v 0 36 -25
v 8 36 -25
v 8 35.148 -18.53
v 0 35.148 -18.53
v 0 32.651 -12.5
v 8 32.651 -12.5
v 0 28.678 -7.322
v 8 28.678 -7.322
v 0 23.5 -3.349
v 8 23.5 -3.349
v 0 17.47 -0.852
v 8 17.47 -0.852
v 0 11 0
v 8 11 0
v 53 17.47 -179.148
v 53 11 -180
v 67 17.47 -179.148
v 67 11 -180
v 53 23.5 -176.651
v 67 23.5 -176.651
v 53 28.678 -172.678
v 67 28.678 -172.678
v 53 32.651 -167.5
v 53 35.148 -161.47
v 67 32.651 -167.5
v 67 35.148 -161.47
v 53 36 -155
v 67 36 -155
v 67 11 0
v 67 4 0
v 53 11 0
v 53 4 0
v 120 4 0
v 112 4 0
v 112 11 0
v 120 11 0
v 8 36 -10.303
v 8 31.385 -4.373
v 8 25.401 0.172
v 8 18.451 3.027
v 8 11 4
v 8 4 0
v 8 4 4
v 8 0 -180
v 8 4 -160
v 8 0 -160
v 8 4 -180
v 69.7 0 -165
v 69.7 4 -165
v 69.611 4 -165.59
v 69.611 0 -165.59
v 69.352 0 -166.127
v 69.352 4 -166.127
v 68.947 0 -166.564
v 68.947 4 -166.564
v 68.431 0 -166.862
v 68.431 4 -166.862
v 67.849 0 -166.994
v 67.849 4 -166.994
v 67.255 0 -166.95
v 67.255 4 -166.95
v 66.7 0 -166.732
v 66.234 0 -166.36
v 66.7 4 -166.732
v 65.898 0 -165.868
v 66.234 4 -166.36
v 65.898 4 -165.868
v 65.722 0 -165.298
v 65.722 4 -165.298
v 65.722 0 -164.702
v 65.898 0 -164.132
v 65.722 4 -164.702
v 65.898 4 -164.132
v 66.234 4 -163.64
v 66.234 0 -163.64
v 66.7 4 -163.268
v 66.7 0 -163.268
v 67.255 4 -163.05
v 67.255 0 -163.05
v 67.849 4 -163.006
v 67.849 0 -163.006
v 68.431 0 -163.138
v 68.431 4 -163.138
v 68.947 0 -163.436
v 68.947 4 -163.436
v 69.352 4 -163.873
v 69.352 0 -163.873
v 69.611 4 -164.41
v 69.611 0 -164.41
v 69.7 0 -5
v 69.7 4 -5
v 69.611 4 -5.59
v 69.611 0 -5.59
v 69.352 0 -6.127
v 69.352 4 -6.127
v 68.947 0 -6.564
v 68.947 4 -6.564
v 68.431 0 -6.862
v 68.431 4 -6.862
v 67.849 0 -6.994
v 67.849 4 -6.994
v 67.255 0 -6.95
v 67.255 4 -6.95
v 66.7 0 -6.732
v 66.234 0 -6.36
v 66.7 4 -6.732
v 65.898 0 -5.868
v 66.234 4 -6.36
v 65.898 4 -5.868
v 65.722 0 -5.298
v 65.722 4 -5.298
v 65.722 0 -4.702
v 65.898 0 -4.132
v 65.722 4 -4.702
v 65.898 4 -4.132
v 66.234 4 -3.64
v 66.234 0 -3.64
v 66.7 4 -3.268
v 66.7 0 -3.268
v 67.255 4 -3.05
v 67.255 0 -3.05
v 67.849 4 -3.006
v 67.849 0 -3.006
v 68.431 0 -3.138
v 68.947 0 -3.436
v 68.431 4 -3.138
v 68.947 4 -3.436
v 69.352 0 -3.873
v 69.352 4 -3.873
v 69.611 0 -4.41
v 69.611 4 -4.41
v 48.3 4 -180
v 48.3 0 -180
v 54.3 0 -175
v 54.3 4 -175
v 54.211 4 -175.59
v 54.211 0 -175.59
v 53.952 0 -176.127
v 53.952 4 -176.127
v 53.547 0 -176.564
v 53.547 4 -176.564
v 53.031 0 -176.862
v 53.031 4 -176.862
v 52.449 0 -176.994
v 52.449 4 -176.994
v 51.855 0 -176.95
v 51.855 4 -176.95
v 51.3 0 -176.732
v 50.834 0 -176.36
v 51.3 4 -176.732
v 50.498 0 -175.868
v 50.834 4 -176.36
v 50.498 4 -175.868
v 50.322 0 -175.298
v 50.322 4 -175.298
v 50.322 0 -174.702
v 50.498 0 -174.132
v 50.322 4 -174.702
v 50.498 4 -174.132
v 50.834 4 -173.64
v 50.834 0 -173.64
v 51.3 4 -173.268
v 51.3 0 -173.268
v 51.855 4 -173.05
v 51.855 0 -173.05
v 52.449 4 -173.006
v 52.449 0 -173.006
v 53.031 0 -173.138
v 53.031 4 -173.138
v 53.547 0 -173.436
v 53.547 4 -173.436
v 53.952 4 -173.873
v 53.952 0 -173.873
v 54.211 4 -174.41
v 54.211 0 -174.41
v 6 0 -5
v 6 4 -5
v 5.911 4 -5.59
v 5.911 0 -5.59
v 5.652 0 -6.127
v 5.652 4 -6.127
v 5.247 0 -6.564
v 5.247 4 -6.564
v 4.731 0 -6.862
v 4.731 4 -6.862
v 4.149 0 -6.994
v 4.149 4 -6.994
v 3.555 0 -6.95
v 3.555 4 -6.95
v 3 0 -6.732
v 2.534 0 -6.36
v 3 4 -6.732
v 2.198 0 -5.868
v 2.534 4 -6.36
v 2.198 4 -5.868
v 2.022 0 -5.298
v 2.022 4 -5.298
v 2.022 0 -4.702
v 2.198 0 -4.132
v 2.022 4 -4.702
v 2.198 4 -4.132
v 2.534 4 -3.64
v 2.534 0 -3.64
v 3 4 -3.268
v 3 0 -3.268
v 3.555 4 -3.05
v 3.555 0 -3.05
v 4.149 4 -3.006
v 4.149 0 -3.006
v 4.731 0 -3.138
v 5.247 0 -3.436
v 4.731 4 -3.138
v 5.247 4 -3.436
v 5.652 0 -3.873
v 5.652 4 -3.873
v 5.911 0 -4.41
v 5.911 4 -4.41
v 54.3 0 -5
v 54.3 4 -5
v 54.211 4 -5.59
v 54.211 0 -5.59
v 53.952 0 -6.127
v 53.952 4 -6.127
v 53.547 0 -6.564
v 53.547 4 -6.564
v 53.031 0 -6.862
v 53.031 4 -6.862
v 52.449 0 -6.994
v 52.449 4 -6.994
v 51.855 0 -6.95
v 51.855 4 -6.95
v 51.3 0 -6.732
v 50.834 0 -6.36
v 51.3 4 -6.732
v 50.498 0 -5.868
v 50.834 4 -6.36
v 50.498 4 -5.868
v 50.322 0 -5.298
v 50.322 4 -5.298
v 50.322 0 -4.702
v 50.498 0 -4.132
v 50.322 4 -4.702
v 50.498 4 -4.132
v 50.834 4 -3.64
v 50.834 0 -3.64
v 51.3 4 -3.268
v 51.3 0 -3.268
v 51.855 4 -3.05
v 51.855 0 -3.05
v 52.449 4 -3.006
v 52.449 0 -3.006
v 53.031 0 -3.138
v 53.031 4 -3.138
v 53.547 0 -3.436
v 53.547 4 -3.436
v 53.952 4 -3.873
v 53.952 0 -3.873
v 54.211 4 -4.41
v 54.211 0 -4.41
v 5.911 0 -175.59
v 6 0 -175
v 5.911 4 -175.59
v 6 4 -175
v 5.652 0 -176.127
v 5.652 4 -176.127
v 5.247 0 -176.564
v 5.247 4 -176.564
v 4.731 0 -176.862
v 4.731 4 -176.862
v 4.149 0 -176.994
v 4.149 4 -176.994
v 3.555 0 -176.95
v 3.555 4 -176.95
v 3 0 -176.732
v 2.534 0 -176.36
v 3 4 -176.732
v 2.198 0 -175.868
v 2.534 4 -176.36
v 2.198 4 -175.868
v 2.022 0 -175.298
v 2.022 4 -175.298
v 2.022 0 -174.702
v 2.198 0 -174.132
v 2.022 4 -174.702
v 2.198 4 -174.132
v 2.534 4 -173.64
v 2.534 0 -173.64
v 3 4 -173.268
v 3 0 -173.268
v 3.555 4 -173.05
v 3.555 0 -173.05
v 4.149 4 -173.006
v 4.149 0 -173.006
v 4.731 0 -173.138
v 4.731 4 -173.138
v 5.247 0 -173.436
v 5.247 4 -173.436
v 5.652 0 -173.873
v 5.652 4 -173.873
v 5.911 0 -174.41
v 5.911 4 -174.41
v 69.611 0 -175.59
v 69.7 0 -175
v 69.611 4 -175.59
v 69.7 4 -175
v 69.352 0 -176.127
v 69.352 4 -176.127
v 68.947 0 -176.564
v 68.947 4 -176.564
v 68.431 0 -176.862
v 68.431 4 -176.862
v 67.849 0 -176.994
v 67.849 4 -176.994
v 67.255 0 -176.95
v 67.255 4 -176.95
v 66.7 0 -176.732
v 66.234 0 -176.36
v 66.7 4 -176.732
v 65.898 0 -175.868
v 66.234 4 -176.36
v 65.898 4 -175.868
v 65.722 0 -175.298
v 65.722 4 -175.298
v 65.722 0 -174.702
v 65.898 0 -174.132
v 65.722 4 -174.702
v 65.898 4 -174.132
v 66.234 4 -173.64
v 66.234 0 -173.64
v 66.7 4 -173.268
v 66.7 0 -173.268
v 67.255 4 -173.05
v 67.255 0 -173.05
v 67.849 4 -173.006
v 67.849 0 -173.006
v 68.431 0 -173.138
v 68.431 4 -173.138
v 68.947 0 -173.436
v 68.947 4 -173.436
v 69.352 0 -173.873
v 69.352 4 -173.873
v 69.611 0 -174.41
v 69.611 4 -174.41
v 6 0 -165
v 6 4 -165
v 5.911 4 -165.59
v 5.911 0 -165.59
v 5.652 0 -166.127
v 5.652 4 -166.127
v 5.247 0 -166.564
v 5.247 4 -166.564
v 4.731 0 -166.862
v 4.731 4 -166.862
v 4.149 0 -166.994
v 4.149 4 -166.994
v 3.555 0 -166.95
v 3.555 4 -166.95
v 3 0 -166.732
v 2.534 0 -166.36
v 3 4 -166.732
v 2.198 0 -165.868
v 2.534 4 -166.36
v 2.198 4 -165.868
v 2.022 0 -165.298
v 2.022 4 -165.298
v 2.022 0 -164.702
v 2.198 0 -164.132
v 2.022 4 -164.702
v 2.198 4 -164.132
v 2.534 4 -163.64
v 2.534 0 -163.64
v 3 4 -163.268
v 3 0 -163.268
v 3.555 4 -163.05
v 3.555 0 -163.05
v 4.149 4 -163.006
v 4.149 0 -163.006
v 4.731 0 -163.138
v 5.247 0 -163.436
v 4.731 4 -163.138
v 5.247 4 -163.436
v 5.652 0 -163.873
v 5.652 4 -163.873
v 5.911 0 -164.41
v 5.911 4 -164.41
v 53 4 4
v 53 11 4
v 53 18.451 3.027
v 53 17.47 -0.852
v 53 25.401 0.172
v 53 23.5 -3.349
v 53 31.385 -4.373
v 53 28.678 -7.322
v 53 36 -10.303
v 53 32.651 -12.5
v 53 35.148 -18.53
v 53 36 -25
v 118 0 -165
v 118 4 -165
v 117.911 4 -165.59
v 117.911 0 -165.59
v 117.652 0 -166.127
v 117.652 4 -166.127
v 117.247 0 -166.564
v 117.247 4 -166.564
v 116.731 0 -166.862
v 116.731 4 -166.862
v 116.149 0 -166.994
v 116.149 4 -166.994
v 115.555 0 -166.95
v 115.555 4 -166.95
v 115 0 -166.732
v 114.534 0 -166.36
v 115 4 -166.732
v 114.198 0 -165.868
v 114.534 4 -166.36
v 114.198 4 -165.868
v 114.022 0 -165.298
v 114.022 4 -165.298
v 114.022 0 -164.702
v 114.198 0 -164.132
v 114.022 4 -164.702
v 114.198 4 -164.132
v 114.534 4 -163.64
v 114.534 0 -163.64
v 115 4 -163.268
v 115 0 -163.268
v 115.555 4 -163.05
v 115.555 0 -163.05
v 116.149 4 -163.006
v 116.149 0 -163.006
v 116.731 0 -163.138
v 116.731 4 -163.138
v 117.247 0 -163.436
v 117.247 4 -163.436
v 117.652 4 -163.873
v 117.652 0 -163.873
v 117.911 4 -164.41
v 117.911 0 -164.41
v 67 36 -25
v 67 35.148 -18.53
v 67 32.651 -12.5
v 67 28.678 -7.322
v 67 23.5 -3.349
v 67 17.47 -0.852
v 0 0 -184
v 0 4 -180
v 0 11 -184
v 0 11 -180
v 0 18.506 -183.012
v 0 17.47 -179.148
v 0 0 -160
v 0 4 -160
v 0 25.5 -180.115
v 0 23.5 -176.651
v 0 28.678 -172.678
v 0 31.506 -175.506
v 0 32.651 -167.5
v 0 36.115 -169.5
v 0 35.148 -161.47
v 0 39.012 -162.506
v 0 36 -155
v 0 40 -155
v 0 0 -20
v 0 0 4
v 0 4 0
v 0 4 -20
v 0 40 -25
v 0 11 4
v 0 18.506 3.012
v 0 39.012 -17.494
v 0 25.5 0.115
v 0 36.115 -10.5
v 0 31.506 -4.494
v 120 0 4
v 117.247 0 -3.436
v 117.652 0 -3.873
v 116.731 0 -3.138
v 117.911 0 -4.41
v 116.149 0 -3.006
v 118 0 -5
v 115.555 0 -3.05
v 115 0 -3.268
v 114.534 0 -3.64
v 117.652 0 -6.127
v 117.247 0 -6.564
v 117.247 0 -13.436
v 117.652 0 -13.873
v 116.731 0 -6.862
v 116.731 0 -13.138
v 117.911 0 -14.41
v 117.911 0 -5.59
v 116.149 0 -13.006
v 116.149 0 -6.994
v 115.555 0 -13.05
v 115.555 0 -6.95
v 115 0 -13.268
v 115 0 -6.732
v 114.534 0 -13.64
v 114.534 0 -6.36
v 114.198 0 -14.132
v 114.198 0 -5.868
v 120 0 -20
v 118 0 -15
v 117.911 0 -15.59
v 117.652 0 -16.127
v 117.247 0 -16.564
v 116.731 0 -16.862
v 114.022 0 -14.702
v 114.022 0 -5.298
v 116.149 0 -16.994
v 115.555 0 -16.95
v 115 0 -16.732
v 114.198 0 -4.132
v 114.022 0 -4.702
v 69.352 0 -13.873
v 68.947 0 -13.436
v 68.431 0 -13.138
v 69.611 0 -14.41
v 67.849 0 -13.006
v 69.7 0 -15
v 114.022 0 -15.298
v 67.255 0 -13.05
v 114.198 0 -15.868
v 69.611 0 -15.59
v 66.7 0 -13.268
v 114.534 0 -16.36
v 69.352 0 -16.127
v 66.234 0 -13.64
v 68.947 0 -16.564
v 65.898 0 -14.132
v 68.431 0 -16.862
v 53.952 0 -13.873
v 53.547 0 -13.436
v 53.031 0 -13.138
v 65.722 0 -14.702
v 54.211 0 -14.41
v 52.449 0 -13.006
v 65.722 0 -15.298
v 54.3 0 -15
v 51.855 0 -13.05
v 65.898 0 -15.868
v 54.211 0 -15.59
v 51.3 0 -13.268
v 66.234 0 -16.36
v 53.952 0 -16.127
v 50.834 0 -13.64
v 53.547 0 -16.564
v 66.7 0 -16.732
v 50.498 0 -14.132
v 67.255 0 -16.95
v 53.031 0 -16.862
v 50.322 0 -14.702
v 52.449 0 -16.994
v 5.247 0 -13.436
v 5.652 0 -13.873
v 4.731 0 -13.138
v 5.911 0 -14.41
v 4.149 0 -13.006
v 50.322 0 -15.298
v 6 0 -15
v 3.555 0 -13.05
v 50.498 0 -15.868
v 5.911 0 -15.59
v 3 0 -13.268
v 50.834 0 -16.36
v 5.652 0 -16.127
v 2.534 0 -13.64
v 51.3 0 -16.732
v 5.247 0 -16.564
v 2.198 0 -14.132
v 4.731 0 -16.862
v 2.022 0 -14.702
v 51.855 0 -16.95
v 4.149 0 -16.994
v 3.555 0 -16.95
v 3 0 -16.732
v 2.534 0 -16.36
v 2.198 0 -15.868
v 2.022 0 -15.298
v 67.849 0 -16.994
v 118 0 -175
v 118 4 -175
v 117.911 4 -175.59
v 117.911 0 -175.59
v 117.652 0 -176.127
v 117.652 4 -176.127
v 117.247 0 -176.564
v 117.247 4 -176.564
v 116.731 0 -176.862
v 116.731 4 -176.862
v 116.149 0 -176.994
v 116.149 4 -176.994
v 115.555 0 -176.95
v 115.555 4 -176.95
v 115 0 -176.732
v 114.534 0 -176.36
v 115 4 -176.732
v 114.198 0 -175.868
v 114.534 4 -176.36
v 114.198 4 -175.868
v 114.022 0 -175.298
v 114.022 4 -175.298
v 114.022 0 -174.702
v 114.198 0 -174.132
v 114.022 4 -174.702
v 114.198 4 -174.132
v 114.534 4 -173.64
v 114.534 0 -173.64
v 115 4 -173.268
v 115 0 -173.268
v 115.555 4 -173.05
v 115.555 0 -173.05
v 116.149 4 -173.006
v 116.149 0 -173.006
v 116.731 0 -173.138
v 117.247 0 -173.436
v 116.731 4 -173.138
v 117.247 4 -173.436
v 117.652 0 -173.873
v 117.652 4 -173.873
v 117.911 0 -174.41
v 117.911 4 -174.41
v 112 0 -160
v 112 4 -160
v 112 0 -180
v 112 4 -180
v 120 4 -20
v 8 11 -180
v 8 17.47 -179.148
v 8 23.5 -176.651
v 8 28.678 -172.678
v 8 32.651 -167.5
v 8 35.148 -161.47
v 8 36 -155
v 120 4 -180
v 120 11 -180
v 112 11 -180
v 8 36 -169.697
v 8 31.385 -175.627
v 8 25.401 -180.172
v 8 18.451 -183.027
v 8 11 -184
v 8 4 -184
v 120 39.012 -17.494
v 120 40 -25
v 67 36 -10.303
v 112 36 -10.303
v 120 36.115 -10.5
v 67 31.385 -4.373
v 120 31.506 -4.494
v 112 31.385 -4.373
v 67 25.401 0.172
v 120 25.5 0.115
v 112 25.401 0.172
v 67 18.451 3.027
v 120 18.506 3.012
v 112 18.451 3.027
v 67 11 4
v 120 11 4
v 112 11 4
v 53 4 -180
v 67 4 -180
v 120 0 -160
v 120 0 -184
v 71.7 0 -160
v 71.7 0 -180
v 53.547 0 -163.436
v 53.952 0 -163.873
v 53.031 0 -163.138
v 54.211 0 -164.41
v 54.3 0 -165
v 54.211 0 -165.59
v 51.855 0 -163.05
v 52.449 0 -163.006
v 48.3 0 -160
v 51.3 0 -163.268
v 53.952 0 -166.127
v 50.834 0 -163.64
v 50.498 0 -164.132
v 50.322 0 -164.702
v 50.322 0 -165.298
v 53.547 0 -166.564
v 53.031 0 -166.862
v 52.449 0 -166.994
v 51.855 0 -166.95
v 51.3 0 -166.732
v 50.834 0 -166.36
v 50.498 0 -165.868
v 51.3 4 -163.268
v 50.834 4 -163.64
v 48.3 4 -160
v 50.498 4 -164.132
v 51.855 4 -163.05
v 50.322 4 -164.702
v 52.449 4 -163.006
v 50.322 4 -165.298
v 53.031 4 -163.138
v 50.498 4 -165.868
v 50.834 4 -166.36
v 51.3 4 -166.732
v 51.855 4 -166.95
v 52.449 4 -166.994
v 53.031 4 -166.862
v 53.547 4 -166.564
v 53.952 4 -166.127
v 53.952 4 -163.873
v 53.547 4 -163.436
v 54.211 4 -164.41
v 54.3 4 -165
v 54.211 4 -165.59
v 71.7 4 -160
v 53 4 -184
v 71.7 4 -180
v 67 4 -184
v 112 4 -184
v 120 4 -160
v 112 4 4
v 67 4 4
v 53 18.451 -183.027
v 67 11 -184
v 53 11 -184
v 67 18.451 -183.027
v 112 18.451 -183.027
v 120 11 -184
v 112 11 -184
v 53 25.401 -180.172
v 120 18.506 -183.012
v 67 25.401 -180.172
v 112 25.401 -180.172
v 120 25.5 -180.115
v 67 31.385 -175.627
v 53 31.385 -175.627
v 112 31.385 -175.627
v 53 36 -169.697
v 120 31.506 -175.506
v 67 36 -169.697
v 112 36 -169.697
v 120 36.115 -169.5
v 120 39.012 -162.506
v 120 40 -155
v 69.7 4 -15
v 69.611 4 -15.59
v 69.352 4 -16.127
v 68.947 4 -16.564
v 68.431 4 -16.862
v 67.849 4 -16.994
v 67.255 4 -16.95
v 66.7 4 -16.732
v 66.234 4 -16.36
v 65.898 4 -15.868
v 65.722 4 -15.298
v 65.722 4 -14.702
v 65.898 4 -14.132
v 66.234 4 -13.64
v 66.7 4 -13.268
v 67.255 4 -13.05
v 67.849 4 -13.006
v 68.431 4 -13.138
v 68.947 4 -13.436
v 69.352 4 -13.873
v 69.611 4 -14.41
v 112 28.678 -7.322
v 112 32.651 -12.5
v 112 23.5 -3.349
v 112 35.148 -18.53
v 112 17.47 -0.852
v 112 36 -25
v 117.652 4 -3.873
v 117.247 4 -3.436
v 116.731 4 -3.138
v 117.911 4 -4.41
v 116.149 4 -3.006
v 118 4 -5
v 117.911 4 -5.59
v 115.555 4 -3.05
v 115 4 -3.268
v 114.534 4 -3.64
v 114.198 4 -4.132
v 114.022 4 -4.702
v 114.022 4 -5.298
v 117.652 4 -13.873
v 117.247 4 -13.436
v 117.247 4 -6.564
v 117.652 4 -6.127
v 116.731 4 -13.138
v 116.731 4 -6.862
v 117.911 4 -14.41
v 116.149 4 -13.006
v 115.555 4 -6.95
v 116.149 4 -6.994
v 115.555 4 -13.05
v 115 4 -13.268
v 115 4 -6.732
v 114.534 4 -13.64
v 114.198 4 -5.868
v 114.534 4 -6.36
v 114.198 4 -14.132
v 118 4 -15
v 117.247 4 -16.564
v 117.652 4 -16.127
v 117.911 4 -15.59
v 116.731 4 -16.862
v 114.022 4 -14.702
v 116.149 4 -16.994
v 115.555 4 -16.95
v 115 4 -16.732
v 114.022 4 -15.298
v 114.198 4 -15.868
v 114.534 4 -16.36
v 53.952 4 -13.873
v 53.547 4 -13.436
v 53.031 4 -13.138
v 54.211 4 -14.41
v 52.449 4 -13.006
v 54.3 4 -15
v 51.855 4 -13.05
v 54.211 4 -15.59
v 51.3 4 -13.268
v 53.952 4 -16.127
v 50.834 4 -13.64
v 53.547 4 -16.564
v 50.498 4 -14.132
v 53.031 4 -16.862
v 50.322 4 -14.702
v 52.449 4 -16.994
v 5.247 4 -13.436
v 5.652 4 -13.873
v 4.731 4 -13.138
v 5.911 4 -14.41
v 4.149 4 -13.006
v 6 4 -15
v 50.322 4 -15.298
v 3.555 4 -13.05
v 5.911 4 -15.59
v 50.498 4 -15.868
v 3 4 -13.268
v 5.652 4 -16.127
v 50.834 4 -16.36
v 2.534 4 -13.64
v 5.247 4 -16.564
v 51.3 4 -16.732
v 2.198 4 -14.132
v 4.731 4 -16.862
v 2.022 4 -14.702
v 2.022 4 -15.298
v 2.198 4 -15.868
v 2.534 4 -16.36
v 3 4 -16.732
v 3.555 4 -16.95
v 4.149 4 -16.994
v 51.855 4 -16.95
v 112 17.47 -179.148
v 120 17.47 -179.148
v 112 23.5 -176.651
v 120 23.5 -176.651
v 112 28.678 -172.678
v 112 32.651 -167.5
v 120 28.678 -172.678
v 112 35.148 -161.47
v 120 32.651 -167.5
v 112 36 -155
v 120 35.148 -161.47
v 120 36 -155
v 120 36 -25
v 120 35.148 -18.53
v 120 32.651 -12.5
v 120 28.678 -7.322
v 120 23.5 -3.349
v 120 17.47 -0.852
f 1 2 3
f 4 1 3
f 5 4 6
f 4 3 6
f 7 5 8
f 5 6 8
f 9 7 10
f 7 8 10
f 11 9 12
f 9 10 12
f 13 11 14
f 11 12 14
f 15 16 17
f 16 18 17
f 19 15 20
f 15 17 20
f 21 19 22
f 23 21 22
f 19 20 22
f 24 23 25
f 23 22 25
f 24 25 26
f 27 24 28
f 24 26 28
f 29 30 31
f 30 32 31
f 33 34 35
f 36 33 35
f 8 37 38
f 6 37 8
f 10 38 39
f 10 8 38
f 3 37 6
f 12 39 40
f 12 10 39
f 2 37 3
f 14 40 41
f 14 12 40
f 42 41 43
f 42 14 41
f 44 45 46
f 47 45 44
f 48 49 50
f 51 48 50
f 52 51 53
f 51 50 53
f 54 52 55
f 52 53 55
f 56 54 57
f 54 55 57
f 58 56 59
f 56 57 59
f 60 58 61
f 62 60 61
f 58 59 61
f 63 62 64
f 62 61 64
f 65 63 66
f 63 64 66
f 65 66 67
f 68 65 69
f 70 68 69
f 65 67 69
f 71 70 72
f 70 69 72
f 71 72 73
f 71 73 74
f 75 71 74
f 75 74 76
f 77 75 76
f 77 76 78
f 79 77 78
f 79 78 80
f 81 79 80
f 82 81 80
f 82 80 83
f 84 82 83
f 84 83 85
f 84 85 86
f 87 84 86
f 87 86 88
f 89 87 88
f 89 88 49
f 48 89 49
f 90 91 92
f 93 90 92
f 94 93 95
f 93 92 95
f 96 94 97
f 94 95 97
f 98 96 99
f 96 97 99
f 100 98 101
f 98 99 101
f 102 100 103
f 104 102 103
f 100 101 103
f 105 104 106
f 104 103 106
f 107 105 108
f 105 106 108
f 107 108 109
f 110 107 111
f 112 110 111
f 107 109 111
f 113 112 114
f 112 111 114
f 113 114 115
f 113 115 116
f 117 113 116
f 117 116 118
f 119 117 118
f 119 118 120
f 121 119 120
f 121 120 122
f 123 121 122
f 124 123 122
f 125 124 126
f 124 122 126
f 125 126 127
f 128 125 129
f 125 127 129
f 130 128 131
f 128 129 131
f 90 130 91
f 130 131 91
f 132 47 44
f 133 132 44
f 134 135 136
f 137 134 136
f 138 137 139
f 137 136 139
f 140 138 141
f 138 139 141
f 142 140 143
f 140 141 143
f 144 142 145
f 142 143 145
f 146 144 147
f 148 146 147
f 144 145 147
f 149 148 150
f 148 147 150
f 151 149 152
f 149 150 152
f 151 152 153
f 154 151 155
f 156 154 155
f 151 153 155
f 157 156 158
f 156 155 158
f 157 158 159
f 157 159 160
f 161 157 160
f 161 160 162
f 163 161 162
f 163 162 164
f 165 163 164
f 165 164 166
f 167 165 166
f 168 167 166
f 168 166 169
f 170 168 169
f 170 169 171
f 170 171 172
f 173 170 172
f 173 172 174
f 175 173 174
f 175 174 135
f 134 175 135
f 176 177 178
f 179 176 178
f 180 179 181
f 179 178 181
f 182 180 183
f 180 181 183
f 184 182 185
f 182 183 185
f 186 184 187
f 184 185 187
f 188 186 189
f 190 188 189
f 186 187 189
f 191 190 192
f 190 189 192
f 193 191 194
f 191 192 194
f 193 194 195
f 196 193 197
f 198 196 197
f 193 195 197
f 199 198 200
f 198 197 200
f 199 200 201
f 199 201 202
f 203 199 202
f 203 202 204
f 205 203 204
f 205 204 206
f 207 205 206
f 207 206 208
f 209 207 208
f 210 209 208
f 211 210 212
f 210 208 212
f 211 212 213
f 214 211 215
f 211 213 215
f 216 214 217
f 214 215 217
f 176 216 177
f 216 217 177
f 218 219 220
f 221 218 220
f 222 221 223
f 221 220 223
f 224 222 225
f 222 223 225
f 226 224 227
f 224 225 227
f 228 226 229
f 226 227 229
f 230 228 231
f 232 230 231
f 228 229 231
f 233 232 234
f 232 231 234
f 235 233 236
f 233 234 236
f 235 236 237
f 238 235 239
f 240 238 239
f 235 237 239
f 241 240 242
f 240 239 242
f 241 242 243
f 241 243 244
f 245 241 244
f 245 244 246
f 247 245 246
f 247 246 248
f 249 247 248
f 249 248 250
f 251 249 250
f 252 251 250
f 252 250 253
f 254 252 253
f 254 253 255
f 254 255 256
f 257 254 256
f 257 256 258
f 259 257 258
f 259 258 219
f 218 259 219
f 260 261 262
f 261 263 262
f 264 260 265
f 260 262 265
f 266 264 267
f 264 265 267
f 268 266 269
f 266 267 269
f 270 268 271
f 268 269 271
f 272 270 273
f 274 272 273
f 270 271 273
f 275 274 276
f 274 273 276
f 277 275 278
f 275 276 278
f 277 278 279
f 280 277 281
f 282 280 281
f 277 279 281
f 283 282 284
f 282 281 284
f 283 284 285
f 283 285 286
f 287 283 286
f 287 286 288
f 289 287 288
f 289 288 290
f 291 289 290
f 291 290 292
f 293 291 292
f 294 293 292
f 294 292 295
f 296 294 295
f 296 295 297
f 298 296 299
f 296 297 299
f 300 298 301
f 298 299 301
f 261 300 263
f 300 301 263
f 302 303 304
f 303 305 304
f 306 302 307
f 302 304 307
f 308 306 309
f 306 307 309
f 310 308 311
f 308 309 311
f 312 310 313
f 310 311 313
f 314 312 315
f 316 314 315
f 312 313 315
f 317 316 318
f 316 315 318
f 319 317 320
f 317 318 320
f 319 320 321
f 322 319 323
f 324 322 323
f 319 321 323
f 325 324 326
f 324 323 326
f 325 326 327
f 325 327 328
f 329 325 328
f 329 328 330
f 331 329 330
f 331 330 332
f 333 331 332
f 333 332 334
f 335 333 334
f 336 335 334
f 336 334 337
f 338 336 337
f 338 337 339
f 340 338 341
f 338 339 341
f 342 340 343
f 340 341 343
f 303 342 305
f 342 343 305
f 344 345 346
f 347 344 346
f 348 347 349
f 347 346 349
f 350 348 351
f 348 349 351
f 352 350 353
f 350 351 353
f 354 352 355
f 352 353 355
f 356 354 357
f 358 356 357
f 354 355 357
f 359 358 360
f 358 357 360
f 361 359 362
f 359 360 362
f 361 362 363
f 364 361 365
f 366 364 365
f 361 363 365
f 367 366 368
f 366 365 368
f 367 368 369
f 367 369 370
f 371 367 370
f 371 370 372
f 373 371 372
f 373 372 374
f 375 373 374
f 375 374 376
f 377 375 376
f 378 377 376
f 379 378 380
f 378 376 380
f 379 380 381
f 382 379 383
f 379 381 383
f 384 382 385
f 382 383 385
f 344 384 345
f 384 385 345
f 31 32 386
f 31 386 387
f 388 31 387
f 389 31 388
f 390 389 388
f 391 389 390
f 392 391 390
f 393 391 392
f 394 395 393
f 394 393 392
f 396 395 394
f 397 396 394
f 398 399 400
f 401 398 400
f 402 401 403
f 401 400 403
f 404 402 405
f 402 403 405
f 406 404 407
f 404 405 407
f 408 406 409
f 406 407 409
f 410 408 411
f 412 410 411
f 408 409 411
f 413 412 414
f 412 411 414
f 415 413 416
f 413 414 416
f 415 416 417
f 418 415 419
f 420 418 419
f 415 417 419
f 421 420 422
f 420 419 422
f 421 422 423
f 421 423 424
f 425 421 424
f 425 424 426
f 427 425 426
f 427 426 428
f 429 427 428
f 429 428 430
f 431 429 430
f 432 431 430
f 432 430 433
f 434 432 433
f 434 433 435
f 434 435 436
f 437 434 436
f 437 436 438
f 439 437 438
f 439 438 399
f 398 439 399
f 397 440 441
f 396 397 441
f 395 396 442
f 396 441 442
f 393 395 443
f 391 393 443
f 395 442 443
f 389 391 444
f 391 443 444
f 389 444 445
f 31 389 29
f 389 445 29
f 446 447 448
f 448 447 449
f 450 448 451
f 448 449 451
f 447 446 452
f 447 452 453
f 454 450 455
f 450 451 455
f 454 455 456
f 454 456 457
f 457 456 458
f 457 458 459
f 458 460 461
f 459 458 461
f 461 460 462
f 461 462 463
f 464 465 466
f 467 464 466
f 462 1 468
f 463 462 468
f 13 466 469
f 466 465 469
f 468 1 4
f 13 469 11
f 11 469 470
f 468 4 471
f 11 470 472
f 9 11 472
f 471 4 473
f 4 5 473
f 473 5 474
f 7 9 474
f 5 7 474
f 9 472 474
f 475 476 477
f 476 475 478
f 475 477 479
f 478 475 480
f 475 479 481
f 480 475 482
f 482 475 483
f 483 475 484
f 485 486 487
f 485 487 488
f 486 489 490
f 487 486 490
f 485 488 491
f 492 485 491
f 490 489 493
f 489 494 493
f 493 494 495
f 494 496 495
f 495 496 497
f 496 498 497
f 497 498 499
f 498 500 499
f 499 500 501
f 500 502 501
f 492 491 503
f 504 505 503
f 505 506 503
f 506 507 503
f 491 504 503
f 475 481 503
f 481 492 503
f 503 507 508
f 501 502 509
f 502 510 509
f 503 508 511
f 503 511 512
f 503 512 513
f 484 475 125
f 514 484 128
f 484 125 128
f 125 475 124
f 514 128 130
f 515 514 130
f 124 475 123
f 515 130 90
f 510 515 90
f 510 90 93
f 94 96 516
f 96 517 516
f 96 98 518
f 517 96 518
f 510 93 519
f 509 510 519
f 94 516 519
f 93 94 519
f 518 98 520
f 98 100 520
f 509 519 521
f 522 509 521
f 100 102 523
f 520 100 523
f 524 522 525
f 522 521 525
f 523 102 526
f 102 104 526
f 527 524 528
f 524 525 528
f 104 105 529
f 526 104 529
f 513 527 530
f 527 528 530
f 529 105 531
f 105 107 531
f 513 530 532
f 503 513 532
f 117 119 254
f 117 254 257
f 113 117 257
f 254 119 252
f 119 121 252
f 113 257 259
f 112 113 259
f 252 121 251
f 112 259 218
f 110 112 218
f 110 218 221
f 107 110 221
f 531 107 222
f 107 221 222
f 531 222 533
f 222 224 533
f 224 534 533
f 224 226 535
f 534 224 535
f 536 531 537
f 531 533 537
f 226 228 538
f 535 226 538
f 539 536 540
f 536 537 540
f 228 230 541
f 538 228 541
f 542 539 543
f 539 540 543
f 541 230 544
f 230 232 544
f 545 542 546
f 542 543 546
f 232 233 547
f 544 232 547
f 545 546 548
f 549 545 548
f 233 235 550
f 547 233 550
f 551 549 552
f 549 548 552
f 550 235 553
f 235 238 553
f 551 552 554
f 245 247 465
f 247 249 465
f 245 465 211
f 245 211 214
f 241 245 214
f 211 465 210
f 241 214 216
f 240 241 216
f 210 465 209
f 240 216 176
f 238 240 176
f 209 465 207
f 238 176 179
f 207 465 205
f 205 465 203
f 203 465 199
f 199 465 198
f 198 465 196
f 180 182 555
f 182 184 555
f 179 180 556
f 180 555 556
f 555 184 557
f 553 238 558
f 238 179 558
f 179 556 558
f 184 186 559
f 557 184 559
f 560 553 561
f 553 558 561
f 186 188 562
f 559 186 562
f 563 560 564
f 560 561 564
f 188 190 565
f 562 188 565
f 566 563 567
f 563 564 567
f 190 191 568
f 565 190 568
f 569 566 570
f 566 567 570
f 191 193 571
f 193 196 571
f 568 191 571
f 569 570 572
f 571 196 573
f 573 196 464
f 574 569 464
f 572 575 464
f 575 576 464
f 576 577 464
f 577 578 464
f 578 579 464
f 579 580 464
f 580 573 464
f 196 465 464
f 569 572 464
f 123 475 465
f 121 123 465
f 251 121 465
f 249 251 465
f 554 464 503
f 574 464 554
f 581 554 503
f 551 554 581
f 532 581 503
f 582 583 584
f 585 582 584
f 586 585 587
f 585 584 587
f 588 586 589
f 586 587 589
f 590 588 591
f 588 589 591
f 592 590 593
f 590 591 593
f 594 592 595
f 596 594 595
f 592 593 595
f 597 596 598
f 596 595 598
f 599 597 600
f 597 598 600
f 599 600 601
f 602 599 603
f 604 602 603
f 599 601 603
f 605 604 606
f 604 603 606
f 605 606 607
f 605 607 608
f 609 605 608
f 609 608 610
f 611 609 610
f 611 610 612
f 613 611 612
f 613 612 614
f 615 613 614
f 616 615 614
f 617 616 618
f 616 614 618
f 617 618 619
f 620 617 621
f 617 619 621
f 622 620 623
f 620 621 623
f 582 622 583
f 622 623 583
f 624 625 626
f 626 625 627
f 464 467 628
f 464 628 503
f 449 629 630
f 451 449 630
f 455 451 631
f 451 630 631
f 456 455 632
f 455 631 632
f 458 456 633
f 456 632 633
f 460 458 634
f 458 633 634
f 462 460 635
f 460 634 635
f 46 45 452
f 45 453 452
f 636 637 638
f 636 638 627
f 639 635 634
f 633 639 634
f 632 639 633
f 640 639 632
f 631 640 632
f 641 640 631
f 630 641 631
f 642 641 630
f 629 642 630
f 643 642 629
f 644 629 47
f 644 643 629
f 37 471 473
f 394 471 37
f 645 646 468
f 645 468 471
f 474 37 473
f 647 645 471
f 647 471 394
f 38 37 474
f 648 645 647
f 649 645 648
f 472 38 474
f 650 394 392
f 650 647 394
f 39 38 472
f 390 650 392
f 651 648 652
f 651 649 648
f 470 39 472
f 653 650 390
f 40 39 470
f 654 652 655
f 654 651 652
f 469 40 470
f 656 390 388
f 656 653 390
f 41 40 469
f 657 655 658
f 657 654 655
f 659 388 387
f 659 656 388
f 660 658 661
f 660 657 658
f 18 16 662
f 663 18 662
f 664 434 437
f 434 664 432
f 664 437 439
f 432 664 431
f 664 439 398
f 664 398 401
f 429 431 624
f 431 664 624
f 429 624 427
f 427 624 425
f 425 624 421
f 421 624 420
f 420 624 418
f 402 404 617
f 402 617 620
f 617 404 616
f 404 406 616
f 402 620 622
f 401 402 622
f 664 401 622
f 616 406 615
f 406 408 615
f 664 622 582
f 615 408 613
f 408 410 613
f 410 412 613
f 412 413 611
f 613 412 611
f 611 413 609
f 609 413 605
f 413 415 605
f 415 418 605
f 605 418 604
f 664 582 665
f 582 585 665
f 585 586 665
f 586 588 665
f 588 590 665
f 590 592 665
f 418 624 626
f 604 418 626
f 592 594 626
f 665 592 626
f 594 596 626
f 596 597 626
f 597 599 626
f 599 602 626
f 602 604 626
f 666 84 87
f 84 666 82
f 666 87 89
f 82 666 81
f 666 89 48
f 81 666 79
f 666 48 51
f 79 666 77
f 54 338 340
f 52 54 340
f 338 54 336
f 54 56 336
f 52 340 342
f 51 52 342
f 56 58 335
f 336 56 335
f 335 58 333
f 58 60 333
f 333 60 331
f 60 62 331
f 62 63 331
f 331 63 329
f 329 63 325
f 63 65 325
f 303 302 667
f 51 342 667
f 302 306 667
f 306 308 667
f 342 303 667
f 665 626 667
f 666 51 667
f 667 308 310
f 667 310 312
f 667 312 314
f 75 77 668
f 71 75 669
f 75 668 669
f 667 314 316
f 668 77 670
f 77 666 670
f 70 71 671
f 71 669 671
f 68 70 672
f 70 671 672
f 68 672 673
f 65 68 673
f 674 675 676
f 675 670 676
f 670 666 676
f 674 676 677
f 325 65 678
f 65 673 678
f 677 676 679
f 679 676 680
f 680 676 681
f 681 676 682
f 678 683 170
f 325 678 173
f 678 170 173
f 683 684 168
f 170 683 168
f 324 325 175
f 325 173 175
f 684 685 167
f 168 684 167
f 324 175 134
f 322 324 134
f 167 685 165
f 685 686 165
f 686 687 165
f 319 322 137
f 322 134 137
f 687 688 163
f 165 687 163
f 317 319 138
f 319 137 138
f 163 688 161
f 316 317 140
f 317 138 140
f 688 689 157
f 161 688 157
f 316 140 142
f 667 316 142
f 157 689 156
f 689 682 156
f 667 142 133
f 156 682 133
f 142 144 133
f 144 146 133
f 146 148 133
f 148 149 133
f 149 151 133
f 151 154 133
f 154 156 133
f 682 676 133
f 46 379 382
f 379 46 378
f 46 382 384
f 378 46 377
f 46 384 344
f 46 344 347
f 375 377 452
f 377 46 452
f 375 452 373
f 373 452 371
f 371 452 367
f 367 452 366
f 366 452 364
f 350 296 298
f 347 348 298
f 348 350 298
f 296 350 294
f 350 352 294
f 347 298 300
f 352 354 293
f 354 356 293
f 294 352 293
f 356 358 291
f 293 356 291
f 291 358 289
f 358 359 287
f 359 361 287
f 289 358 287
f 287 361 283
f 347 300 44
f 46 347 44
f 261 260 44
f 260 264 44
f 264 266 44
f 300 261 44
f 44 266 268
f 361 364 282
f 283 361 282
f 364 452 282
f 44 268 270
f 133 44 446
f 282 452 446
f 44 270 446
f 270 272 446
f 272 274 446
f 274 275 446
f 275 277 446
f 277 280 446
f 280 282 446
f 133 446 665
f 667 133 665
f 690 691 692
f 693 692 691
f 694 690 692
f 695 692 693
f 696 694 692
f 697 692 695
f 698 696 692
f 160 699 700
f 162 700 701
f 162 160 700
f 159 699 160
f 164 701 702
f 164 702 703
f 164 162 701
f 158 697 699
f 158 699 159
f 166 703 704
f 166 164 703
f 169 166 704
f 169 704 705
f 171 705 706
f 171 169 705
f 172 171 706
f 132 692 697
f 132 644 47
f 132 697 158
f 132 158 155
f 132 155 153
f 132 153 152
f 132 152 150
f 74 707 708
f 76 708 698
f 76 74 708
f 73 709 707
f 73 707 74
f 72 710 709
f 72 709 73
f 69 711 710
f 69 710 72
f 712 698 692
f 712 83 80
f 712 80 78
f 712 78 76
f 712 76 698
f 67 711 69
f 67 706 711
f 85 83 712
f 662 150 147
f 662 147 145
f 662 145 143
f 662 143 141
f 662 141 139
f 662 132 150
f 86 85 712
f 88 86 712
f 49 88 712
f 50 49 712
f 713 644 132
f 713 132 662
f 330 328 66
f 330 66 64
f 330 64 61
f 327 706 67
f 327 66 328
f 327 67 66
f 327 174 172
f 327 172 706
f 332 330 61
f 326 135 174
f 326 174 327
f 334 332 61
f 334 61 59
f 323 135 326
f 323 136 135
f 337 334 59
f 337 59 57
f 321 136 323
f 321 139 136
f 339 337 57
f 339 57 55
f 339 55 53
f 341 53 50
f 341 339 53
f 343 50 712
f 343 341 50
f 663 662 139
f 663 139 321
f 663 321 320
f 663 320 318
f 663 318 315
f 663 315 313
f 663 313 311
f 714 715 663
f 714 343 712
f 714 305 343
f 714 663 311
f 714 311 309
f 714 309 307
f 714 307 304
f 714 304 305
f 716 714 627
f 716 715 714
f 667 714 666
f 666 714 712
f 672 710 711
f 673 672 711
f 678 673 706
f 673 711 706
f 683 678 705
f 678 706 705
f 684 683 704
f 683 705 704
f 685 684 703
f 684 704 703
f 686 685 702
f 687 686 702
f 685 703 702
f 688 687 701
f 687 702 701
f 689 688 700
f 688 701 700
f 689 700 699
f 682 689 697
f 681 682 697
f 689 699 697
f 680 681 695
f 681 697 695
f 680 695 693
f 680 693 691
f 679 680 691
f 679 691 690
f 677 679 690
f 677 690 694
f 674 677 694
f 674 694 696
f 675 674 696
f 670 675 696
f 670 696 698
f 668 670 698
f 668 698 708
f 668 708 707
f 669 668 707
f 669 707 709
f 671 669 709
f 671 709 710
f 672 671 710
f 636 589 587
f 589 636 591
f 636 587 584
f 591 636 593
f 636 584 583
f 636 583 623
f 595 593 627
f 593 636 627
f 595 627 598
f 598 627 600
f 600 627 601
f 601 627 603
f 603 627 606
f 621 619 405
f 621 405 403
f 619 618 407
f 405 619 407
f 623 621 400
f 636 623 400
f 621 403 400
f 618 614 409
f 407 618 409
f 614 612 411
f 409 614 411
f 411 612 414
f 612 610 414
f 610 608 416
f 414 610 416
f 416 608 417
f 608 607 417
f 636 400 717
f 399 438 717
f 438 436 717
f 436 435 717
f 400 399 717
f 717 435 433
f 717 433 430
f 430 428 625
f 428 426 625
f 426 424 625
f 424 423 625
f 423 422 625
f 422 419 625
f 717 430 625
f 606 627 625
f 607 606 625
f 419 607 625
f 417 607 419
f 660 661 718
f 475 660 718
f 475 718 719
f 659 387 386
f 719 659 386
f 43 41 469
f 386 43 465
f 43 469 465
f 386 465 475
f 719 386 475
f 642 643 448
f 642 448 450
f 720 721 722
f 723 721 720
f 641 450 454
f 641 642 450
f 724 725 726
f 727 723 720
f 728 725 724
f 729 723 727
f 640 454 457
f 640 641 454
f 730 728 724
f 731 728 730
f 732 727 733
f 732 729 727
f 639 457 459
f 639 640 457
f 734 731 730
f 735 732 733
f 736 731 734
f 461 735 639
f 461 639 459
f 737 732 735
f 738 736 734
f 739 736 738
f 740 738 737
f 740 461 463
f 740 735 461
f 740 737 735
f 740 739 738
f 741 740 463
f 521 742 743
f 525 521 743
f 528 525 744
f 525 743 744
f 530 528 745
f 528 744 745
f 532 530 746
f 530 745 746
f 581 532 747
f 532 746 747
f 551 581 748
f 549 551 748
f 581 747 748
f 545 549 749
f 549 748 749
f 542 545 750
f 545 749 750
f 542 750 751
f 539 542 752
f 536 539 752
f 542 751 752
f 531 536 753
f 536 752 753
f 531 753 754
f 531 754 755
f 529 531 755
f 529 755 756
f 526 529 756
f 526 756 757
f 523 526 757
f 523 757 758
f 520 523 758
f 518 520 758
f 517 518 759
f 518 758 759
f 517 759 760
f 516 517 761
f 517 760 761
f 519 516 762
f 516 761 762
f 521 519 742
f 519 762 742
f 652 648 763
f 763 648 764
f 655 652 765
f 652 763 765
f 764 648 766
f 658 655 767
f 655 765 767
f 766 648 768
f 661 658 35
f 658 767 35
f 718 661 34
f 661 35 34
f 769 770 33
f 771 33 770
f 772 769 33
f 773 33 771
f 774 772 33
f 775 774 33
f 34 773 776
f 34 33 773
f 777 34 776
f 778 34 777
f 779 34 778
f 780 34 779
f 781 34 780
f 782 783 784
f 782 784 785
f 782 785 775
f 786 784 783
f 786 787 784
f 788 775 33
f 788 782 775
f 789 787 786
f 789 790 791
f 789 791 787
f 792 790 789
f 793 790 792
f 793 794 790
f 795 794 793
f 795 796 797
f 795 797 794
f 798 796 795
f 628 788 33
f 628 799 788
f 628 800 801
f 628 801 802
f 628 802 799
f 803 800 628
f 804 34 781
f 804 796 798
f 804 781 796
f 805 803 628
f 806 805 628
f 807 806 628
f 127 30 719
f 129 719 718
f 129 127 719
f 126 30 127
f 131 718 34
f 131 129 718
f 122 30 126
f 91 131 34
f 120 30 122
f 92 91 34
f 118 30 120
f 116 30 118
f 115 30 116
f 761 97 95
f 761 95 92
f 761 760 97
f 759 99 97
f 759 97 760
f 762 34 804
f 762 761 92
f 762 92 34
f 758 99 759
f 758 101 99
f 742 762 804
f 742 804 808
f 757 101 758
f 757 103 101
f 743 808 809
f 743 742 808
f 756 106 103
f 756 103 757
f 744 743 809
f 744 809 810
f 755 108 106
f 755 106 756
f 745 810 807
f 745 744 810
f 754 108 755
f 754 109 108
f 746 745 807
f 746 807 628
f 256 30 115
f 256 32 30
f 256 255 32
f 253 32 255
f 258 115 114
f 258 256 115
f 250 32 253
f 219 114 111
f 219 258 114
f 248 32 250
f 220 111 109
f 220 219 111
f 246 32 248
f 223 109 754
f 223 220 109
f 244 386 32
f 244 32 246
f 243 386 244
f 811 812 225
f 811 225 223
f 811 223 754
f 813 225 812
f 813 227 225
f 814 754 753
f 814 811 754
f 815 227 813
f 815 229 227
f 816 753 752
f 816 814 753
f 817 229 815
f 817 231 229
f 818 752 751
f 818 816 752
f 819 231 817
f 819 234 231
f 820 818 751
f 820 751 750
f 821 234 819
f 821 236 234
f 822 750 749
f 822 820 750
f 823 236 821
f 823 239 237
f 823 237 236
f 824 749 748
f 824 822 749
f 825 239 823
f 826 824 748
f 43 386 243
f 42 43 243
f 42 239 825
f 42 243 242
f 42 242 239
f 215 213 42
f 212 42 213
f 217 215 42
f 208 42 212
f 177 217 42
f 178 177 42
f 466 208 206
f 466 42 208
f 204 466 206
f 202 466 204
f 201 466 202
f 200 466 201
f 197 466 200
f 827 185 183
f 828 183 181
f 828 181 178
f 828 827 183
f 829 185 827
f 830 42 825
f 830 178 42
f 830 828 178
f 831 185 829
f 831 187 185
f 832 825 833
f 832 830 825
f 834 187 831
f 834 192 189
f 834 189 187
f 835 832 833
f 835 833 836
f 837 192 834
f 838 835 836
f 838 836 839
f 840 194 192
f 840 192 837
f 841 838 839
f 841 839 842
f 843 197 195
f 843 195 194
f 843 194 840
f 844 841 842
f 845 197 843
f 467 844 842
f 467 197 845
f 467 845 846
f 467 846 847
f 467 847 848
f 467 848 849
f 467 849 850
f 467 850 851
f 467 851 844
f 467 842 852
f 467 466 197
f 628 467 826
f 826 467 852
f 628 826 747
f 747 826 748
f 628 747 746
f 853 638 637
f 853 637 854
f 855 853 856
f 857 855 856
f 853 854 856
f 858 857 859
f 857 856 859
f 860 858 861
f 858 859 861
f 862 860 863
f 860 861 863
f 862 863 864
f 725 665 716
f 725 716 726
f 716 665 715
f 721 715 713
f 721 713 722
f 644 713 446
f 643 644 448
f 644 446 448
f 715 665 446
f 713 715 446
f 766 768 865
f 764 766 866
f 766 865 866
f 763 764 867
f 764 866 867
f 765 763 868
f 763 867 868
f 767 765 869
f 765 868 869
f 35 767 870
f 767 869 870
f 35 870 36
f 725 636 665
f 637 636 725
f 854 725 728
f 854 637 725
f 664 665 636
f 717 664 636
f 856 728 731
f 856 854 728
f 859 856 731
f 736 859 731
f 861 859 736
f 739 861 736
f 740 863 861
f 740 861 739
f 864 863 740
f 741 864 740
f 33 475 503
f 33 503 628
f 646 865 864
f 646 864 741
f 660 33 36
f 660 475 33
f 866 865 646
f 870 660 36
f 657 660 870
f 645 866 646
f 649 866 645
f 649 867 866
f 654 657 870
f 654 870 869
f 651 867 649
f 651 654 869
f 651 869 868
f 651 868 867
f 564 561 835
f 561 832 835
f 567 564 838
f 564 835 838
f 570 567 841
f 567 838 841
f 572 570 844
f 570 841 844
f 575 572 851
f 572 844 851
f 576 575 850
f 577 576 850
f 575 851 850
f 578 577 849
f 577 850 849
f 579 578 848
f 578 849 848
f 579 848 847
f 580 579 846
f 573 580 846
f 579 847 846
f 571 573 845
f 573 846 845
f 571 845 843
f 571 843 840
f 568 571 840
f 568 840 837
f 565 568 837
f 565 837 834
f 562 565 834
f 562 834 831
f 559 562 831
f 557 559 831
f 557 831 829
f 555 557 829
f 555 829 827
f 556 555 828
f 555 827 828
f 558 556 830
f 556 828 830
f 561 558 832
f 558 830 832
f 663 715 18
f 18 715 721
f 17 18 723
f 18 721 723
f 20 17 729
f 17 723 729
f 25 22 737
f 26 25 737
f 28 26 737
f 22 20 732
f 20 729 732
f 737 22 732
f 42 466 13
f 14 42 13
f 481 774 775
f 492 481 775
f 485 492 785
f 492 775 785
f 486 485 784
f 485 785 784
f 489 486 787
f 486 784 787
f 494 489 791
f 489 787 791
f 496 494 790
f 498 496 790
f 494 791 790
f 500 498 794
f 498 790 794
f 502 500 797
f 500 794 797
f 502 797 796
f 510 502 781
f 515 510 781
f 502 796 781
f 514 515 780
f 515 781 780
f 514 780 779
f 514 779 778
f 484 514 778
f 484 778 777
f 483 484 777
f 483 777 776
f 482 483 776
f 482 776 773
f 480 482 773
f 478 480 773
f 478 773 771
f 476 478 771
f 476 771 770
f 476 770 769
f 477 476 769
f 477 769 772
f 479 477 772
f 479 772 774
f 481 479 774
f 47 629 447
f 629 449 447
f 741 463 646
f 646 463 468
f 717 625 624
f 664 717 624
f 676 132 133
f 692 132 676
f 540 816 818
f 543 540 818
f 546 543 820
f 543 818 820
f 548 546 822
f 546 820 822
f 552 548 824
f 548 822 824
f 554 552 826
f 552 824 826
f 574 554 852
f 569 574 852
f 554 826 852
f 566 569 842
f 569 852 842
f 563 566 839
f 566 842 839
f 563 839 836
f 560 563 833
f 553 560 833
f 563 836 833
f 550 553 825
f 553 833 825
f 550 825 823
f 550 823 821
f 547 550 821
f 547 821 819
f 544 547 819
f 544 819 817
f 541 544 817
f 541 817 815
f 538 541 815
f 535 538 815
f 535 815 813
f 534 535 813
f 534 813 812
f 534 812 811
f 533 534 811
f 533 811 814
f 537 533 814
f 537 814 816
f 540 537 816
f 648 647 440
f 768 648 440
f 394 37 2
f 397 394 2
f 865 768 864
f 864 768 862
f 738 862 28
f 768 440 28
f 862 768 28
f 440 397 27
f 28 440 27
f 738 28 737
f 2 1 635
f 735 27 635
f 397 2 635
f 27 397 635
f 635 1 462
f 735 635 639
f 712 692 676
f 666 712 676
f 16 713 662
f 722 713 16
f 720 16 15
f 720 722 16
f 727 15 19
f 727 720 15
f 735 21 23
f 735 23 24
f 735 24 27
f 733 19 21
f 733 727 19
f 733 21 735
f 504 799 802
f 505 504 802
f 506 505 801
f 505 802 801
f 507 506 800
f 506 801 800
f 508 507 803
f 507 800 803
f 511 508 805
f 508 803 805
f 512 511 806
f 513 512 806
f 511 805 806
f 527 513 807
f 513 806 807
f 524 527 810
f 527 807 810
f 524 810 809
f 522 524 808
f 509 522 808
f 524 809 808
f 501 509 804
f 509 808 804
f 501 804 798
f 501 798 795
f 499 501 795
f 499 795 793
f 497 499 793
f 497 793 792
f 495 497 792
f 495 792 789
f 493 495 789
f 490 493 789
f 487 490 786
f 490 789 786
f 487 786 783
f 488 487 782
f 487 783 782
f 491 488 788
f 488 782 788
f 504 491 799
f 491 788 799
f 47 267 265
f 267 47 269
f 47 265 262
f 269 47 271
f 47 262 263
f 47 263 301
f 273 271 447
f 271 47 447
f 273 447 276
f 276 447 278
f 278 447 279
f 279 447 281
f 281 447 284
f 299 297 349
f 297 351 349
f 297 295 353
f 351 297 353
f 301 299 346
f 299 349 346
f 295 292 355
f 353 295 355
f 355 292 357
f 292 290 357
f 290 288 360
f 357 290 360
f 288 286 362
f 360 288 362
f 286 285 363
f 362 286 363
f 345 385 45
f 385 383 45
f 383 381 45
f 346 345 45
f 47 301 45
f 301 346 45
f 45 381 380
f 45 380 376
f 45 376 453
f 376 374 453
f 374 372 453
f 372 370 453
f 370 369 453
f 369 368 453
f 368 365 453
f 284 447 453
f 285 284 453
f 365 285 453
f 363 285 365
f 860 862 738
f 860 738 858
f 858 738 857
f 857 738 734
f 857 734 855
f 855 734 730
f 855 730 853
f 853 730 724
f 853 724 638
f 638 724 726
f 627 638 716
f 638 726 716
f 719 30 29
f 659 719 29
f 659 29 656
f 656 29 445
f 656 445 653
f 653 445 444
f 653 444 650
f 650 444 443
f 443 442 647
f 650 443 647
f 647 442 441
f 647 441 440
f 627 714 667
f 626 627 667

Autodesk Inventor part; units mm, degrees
ref_plane "YZ Plane" through (0, 0, 0) normal (1, 0, 0) x (0, 1, 0)
ref_plane "XZ Plane" through (0, 0, 0) normal (0, 1, 0) x (-1, 0, 0)
ref_plane "XY Plane" through (0, 0, 0) normal (0, 0, 1) x (1, 0, 0)
sketch "Sketch1" plane through (0, 0, 0) normal (1, 0, 0) x (0, 1, 0)
  line L0 (0, 0) -> (40, 0)
  line L1 (40, 0) -> (40, -180)
  line L2 (40, -180) -> (0, -180)
  line L3 (0, -180) -> (0, 0)
  line L4 (0, 0) -> (4, 0)
  line L5 (4, 0) -> (4, -20)
  line L6 (4, -20) -> (0, -20)
  line L7 (0, -20) -> (0, 0)
  line L8 (0, -180) -> (4, -180)
  line L9 (4, -180) -> (4, -160)
  line L10 (4, -160) -> (0, -160)
  line L11 (0, -160) -> (0, -180)
  line L12 (4, -20) -> (4, -56)
  line L13 (4, -160) -> (4, -124)
  line L14 (4, -56) -> (40, -56)
  line L15 (4, -124) -> (40, -124)
  line L16 (40, -124) -> (4, -160)
  line L17 (4, -20) -> (40, -56)
  line L18 (40, -56) -> (36, -56)
  line L19 (36, -56) -> (36, -124)
  line L20 (36, -124) -> (40, -124)
  line L21 (40, -124) -> (40, -56)
  line L22 (4, -20) -> (1.1716, -22.8284)
  line L23 (1.1716, -22.8284) -> (36, -57.6569)
  line L24 (1.1716, -22.8284) -> (0, -21.6569)
  line L25 (4, -160) -> (1.1716, -157.1716)
  line L26 (1.1716, -157.1716) -> (36, -122.3431)
  line L27 (1.1716, -157.1716) -> (-0.2426, -158.5858)
  line L28 (0, 0) -> (40, 0)
  line L29 (40, 0) -> (40, 4)
  line L30 (40, 4) -> (0, 4)
  line L31 (0, 4) -> (0, 0)
  line L32 (40, 0) -> (36, 0)
  line L33 (36, 0) -> (36, -56)
  line L34 (36, -56) -> (40, -56)
  line L35 (40, -56) -> (40, 0)
  line L36 (40, -180) -> (0, -180)
  line L37 (0, -180) -> (0, -184)
  line L38 (0, -184) -> (40, -184)
  line L39 (40, -184) -> (40, -180)
  line L40 (36, -124) -> (40, -124)
  line L41 (40, -124) -> (40, -180)
  line L42 (40, -180) -> (36, -180)
  line L43 (36, -180) -> (36, -124)
  point P0 (0, -158.3431)
  dimension "d0" = 40
  dimension "d1" = 180
  dimension "d2" = 4
  dimension "d3" = 20
  dimension "d4" = 4
  dimension "d5" = 20
  dimension "d6" = 36
  dimension "d7" = 36
  dimension "d8" = 4
  dimension "d9" = 4
  dimension "d10" = 4
  dimension "d67" = 4
  dimension "d68" = 4
extrude "Extrusion1" add sketch "Sketch1" along normal blind 120 contours L31 L30 L29 L0 | L0 L5 L6 L3 | L0 L1 L17 L33 | L17 L14 L33 | L1 L15 L19 L14 | L10 L9 L2 L3 | L16 L43 L15 | L1 L2 L43 L16 | L2 L39 L38 L37
sketch "Sketch2" plane through (0, 4, 0) normal (0, 1, 0) x (1, 0, 0)
  line L0 (0, 0) -> (120, 0) projected
  line L1 (0, 0) -> (4, 0)
  line L2 (4, 0) -> (4, 5)
  line L3 (4, 5) -> (0, 5)
  line L4 (0, 5) -> (0, 0)
  line L5 (4, 5) -> (4, 15)
  circle A0 centre (4, 15) radius 2
  circle A1 centre (4, 5) radius 2
  line L6 (120, 0) -> (116, 0)
  line L7 (116, 0) -> (116, 5)
  line L8 (116, 5) -> (120, 5)
  line L9 (120, 5) -> (120, 0)
  line L10 (116, 5) -> (116, 15)
  circle A2 centre (116, 15) radius 2
  circle A3 centre (116, 5) radius 2
  line L11 (0, 20) -> (120, 20) projected
  line L12 (120, 0) -> (112, 0)
  line L13 (112, 0) -> (112, 20)
  line L14 (112, 20) -> (120, 20)
  line L15 (120, 20) -> (120, 0)
  line L16 (0, 0) -> (8, 0)
  line L17 (8, 0) -> (8, 20)
  line L18 (8, 20) -> (0, 20)
  line L19 (0, 20) -> (0, 0)
  line L20 (112, 20) -> (71.7, 20)
  line L21 (71.7, 20) -> (71.7, 0)
  line L22 (71.7, 0) -> (112, 0)
  line L23 (112, 0) -> (112, 20)
  line L24 (8, 20) -> (48.3, 20)
  line L25 (48.3, 20) -> (48.3, 0)
  line L26 (48.3, 0) -> (8, 0)
  line L27 (8, 0) -> (8, 20)
  line L28 (48.3, 0) -> (52.3, 0)
  line L29 (52.3, 0) -> (52.3, 5)
  line L30 (52.3, 5) -> (48.3, 5)
  line L31 (48.3, 5) -> (48.3, 0)
  line L32 (52.3, 5) -> (52.3, 15)
  circle A4 centre (52.3, 15) radius 2
  circle A5 centre (52.3, 5) radius 2
  line L33 (48.3, 20) -> (48.3, 0)
  line L34 (71.7, 0) -> (67.7, 0)
  line L35 (67.7, 0) -> (67.7, 5)
  line L36 (67.7, 5) -> (71.7, 5)
  line L37 (71.7, 5) -> (71.7, 0)
  line L38 (67.7, 5) -> (67.7, 15)
  circle A6 centre (67.7, 15) radius 2
  circle A7 centre (67.7, 5) radius 2
  line L39 (71.7, 20) -> (71.7, 0)
  line L40 (0, 20) -> (120, 20)
  line L41 (120, 20) -> (120, 0)
  line L42 (120, 0) -> (0, 0)
  line L43 (0, 0) -> (0, 20)
  line L44 (0, 180) -> (0, 160) projected
  line L45 (0, 180) -> (-1.8149, 180)
  line L46 (0, 160) -> (4, 160)
  line L47 (4, 160) -> (4, 165)
  line L48 (4, 165) -> (0, 165)
  line L49 (0, 165) -> (0, 160)
  line L50 (4, 165) -> (4, 175)
  circle A8 centre (4, 175) radius 2
  circle A9 centre (4, 165) radius 2
  line L51 (120, 160) -> (116, 160)
  line L52 (116, 160) -> (116, 165)
  line L53 (116, 165) -> (120, 165)
  line L54 (120, 165) -> (120, 160)
  line L55 (116, 165) -> (116, 175)
  circle A10 centre (116, 175) radius 2
  circle A11 centre (116, 165) radius 2
  line L56 (120, 160) -> (112, 160)
  line L57 (112, 160) -> (112, 180)
  line L58 (112, 180) -> (120, 180)
  line L59 (120, 180) -> (120, 160)
  line L60 (0, 160) -> (8, 160)
  line L61 (8, 160) -> (8, 180)
  line L62 (8, 180) -> (0, 180)
  line L63 (0, 180) -> (0, 160)
  line L64 (112, 180) -> (71.7, 180)
  line L65 (71.7, 180) -> (71.7, 160)
  line L66 (71.7, 160) -> (112, 160)
  line L67 (112, 160) -> (112, 180)
  line L68 (8, 180) -> (48.3, 180)
  line L69 (48.3, 180) -> (48.3, 160)
  line L70 (48.3, 160) -> (8, 160)
  line L71 (8, 160) -> (8, 180)
  line L72 (52.3, 165) -> (52.3, 175)
  circle A12 centre (52.3, 165) radius 2
  circle A13 centre (52.3, 175) radius 2
  line L73 (48.3, 180) -> (48.3, 160)
  line L74 (52.3, 165) -> (48.3, 165)
  line L75 (48.3, 160) -> (52.3, 160)
  line L76 (48.3, 165) -> (48.3, 160)
  line L77 (52.3, 160) -> (52.3, 165)
  line L78 (67.7, 160) -> (67.7, 165)
  line L79 (67.7, 165) -> (67.7, 175)
  circle A14 centre (67.7, 165) radius 2
  circle A15 centre (67.7, 175) radius 2
  line L80 (71.7, 160) -> (67.7, 160)
  line L81 (71.7, 165) -> (71.7, 160)
  line L82 (67.7, 165) -> (71.7, 165)
  line L83 (71.7, 180) -> (71.7, 160)
  line L84 (0, 180) -> (120, 180)
  line L85 (120, 180) -> (120, 160)
  line L86 (120, 160) -> (0, 160)
  line L87 (0, 160) -> (0, 180)
  point P0 (112, 0)
  dimension "d13" = 4
  dimension "d14" = 5
  dimension "d15" = 10
  dimension "d16" = 4
  dimension "d17" = 4
  dimension "d18" = 4
  dimension "d19" = 5
  dimension "d20" = 10
  dimension "d21" = 4
  dimension "d22" = 4
  dimension "d23" = 8
  dimension "d24" = 8
  dimension "d25" = 40.3
  dimension "d26" = 40.3
  dimension "d27" = 4
  dimension "d28" = 5
  dimension "d29" = 10
  dimension "d30" = 4
  dimension "d31" = 4
  dimension "d32" = 4
  dimension "d33" = 5
  dimension "d34" = 10
  dimension "d35" = 4
  dimension "d36" = 4
  dimension "d37" = 4
  dimension "d38" = 5
  dimension "d39" = 10
  dimension "d40" = 4
  dimension "d41" = 4
  dimension "d42" = 4
  dimension "d43" = 5
  dimension "d44" = 10
  dimension "d45" = 4
  dimension "d46" = 4
  dimension "d47" = 8
  dimension "d48" = 8
  dimension "d49" = 40.3
  dimension "d50" = 40.3
  dimension "d51" = 4
  dimension "d52" = 5
  dimension "d53" = 10
  dimension "d54" = 4
  dimension "d55" = 4
  dimension "d56" = 4
  dimension "d57" = 5
  dimension "d58" = 10
  dimension "d59" = 4
  dimension "d60" = 4
extrude "Extrusion2" cut sketch "Sketch2" against normal blind 120 contours A0 | A1 L3 L2 | L2 L5 A1 | A1 L5 L3 | A6 | A4 | A5 L30 L29 | L29 L32 A5 | A5 L32 L30 | A7 L38 L35 | L35 L36 A7 | A2 | L38 A7 L36 | A3 L10 L7 | L7 L8 A3 | L8 L10 A3 | A8 | L68 L69 L70 L61 | A9 L50 L48 | L48 L47 A9 | A13 | A15 | L50 A9 L47 | L64 L57 L66 L65 | L74 L77 A12 | A12 L72 L74 | A10 | L77 L72 A12 | L82 L79 A14 | A14 L78 L82 | A14 L79 L78 | A11 L55 L52 | L52 L53 A11 | L53 L55 A11
sketch "Sketch4" plane through (0, 4, -180) normal (0, 0, 1) x (1, 0, 0)
  line L0 (8, 0) -> (8, -4) projected
  line L1 (0, 32) -> (120, 32) projected
  line L2 (8, 0) -> (53, 0)
  line L3 (53, 0) -> (53, 32)
  line L4 (53, 32) -> (8, 32)
  line L5 (8, 32) -> (8, 0)
  line L6 (112, 0) -> (112, -4) projected
  line L7 (112, 0) -> (67, 0)
  line L8 (67, 0) -> (67, 32)
  line L9 (67, 32) -> (112, 32)
  line L10 (112, 32) -> (112, 0)
  point P0 (0, -4)
  point P1 (67, 32)
  point P2 (8, 32)
  dimension "d69" = 45
  dimension "d70" = 45
fillet "Fillet1" radius 25 2 edges at (60, 36, -180) (60, 36, 0)
fillet "Fillet2" radius 29 2 edges at (60, 40, -184) (60, 40, 4)
extrude "Extrusion4" cut sketch "Sketch4" along normal mid plane 1000
properties part number "back"
